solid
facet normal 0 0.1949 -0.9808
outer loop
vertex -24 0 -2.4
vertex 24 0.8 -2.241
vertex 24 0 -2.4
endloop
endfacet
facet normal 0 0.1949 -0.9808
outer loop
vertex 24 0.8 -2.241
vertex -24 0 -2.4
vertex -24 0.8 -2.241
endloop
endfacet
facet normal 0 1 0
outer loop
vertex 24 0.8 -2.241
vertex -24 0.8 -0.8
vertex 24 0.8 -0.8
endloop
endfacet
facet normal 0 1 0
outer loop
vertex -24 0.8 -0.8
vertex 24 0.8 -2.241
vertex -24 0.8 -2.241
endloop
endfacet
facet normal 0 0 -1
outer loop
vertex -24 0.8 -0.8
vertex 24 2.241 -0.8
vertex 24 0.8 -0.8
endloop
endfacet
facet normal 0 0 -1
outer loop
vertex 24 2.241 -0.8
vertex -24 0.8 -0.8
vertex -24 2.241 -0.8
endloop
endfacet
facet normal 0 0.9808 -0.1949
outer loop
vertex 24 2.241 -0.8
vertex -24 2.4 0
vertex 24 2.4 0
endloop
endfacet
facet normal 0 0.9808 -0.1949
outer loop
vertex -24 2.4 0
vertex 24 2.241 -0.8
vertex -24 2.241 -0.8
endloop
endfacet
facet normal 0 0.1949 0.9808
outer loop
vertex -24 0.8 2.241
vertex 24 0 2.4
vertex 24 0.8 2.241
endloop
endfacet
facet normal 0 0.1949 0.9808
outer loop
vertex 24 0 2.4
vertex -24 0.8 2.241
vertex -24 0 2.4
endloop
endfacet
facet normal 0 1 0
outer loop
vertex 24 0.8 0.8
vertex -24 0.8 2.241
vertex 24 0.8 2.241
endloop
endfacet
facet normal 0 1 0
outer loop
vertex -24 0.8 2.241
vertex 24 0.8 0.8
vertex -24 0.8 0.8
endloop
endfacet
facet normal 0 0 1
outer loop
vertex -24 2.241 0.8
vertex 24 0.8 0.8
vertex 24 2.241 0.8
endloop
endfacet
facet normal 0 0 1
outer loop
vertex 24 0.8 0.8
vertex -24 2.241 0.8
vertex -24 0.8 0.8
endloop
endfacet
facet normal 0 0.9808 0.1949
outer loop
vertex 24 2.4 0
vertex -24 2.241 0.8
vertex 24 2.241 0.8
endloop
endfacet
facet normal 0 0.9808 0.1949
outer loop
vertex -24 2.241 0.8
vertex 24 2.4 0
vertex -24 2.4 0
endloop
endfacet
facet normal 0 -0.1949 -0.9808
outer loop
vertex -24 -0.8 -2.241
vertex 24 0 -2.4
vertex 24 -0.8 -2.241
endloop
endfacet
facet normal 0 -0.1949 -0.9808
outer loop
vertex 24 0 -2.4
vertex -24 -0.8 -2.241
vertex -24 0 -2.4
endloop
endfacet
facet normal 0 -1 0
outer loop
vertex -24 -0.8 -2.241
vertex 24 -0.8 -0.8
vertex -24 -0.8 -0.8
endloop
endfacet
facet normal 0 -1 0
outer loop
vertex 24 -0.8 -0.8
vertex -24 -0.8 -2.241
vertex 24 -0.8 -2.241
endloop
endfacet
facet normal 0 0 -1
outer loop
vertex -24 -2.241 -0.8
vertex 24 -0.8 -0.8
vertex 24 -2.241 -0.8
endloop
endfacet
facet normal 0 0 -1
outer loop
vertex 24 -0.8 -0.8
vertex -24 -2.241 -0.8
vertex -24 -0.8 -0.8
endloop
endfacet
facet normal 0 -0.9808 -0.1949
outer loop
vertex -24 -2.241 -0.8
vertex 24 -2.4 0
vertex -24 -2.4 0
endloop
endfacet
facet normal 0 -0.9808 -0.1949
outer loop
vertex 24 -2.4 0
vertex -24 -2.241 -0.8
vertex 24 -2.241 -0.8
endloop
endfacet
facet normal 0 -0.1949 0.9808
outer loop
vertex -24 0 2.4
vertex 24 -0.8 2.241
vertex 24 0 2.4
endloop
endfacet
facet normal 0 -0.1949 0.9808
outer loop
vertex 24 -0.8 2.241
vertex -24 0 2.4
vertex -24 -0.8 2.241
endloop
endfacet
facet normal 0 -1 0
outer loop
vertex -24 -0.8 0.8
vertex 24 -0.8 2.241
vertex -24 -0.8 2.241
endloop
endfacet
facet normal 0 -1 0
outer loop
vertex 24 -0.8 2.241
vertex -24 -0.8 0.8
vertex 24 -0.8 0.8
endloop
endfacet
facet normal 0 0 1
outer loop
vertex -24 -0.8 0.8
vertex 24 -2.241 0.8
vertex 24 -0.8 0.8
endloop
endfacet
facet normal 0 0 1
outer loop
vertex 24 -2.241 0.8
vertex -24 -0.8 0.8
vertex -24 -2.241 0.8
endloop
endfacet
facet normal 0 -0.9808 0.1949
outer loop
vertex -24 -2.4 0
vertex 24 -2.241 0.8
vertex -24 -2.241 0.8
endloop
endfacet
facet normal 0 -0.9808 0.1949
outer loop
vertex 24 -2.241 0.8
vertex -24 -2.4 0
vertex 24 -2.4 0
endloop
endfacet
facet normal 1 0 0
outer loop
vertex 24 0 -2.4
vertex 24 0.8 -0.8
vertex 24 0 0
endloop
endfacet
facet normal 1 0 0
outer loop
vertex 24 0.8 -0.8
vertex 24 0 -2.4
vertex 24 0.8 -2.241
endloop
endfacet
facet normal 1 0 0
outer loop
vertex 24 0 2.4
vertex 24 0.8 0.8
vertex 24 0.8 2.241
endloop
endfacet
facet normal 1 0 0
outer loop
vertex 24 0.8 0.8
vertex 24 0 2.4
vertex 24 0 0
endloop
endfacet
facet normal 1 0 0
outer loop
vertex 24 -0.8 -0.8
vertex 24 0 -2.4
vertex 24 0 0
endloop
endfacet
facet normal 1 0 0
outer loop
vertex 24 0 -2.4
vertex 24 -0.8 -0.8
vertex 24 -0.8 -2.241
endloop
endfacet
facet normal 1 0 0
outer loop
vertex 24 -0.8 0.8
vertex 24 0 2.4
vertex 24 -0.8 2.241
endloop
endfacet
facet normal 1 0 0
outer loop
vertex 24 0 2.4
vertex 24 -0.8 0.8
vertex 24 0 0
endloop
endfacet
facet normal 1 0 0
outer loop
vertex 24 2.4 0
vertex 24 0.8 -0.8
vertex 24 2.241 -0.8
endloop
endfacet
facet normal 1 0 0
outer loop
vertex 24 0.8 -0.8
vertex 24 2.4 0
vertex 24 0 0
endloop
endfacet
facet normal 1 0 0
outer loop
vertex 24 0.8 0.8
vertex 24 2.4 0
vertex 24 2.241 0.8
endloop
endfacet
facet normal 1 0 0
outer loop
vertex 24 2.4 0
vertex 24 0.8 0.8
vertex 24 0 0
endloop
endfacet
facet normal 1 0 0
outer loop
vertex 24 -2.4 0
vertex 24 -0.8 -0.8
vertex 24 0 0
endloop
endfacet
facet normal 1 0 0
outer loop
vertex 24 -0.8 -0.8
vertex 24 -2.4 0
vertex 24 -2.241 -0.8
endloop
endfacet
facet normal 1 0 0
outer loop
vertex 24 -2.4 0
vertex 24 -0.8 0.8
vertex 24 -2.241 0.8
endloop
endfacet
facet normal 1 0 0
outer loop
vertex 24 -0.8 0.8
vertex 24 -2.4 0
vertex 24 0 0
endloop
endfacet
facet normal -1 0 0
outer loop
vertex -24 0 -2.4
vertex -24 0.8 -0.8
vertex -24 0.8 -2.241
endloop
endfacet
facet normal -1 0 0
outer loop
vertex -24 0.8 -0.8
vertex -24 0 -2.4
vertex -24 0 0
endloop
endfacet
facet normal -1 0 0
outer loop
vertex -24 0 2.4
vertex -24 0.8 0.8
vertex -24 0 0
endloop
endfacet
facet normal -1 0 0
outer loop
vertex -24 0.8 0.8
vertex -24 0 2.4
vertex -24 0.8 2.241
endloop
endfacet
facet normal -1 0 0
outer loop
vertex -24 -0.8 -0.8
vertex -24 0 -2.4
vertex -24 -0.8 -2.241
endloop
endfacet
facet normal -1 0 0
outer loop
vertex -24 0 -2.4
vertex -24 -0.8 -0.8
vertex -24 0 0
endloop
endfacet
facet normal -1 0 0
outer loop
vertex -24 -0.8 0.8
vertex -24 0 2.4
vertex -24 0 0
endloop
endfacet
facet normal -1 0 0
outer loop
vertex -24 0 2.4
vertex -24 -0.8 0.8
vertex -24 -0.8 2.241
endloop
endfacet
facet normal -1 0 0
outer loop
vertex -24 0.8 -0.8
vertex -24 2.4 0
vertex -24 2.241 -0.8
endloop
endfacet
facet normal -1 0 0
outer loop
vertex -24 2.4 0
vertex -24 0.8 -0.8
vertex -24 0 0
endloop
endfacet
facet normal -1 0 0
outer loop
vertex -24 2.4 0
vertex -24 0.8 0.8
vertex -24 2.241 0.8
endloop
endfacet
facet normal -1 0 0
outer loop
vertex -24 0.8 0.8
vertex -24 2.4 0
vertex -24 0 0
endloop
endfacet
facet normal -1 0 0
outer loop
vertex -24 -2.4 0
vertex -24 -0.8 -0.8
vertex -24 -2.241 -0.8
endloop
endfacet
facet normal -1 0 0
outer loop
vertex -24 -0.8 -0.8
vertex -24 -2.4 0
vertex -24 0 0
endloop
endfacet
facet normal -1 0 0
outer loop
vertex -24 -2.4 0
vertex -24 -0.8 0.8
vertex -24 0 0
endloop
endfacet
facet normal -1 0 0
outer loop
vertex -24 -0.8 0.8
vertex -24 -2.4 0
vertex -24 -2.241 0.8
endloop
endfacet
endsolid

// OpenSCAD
// file: ../p/axle.scad
use <../lib.scad>
function ldraw_lib__axle() = [
// 0 Axle
// 0 Name: axle.dat
// 0 Author: James Jessiman
// 0 !LDRAW_ORG Primitive UPDATE 2003-01
// 0 !LICENSE Licensed under CC BY 4.0 : see CAreadme.txt
// 
// 0 BFC CERTIFY CCW
  [0,"BFC","CERTIFY"],
  [0,"BFC","CCW"],
// 
// 0 !HISTORY 2000-04-23 [sbliss] Added conditional edges along outermost diameters
// 0 !HISTORY 2000-05-07 [PTadmin] Official Update 2000-01
// 0 !HISTORY 2002-11-08 [OrionP] Adjusted fit and precision
// 0 !HISTORY 2003-03-12 [PTadmin] Official Update 2003-01
// 0 !HISTORY 2007-06-24 [PTadmin] Header formatted for Contributor Agreement
// 0 !HISTORY 2008-07-01 [PTadmin] Official Update 2008-01
// 
// 
// 5 24 6 0 0 6 1 0 5.602 0 2 5.602 0 -2
  [5,24,6,0,0,6,1,0,5.602,0,2,5.602,0,-2],
// 5 24 0 0 6 0 1 6 2 0 5.602 -2 0 5.602
  [5,24,0,0,6,0,1,6,2,0,5.602,-2,0,5.602],
// 5 24 -6 0 0 -6 1 0 -5.602 0 -2 -5.602 0 2
  [5,24,-6,0,0,-6,1,0,-5.602,0,-2,-5.602,0,2],
// 5 24 0 0 -6 0 1 -6 -2 0 -5.602 2 0 -5.602
  [5,24,0,0,-6,0,1,-6,-2,0,-5.602,2,0,-5.602],
// 
// 2 24 6 0 0 5.602 0 2
  [2,24,6,0,0,5.602,0,2],
// 2 24 5.602 0 2 2 0 2
  [2,24,5.602,0,2,2,0,2],
// 2 24 2 0 2 2 0 5.602
  [2,24,2,0,2,2,0,5.602],
// 2 24 2 0 5.602 0 0 6
  [2,24,2,0,5.602,0,0,6],
// 2 24 -6 0 0 -5.602 0 2
  [2,24,-6,0,0,-5.602,0,2],
// 2 24 -5.602 0 2 -2 0 2
  [2,24,-5.602,0,2,-2,0,2],
// 2 24 -2 0 2 -2 0 5.602
  [2,24,-2,0,2,-2,0,5.602],
// 2 24 -2 0 5.602 -0 0 6
  [2,24,-2,0,5.602,-0,0,6],
// 2 24 6 0 -0 5.602 0 -2
  [2,24,6,0,-0,5.602,0,-2],
// 2 24 5.602 0 -2 2 0 -2
  [2,24,5.602,0,-2,2,0,-2],
// 2 24 2 0 -2 2 0 -5.602
  [2,24,2,0,-2,2,0,-5.602],
// 2 24 2 0 -5.602 0 0 -6
  [2,24,2,0,-5.602,0,0,-6],
// 2 24 -6 0 -0 -5.602 0 -2
  [2,24,-6,0,-0,-5.602,0,-2],
// 2 24 -5.602 0 -2 -2 0 -2
  [2,24,-5.602,0,-2,-2,0,-2],
// 2 24 -2 0 -2 -2 0 -5.602
  [2,24,-2,0,-2,-2,0,-5.602],
// 2 24 -2 0 -5.602 -0 0 -6
  [2,24,-2,0,-5.602,-0,0,-6],
// 2 24 6 1 0 5.602 1 2
  [2,24,6,1,0,5.602,1,2],
// 2 24 5.602 1 2 2 1 2
  [2,24,5.602,1,2,2,1,2],
// 2 24 2 1 2 2 1 5.602
  [2,24,2,1,2,2,1,5.602],
// 2 24 2 1 5.602 0 1 6
  [2,24,2,1,5.602,0,1,6],
// 2 24 -6 1 0 -5.602 1 2
  [2,24,-6,1,0,-5.602,1,2],
// 2 24 -5.602 1 2 -2 1 2
  [2,24,-5.602,1,2,-2,1,2],
// 2 24 -2 1 2 -2 1 5.602
  [2,24,-2,1,2,-2,1,5.602],
// 2 24 -2 1 5.602 -0 1 6
  [2,24,-2,1,5.602,-0,1,6],
// 2 24 6 1 -0 5.602 1 -2
  [2,24,6,1,-0,5.602,1,-2],
// 2 24 5.602 1 -2 2 1 -2
  [2,24,5.602,1,-2,2,1,-2],
// 2 24 2 1 -2 2 1 -5.602
  [2,24,2,1,-2,2,1,-5.602],
// 2 24 2 1 -5.602 0 1 -6
  [2,24,2,1,-5.602,0,1,-6],
// 2 24 -6 1 -0 -5.602 1 -2
  [2,24,-6,1,-0,-5.602,1,-2],
// 2 24 -5.602 1 -2 -2 1 -2
  [2,24,-5.602,1,-2,-2,1,-2],
// 2 24 -2 1 -2 -2 1 -5.602
  [2,24,-2,1,-2,-2,1,-5.602],
// 2 24 -2 1 -5.602 -0 1 -6
  [2,24,-2,1,-5.602,-0,1,-6],
// 
// 2 24 5.602 0 2 5.602 1 2
  [2,24,5.602,0,2,5.602,1,2],
// 2 24 2 0 2 2 1 2
  [2,24,2,0,2,2,1,2],
// 2 24 2 0 5.602 2 1 5.602
  [2,24,2,0,5.602,2,1,5.602],
// 2 24 -5.602 0 2 -5.602 1 2
  [2,24,-5.602,0,2,-5.602,1,2],
// 2 24 -2 0 2 -2 1 2
  [2,24,-2,0,2,-2,1,2],
// 2 24 -2 0 5.602 -2 1 5.602
  [2,24,-2,0,5.602,-2,1,5.602],
// 2 24 5.602 0 -2 5.602 1 -2
  [2,24,5.602,0,-2,5.602,1,-2],
// 2 24 2 0 -2 2 1 -2
  [2,24,2,0,-2,2,1,-2],
// 2 24 2 0 -5.602 2 1 -5.602
  [2,24,2,0,-5.602,2,1,-5.602],
// 2 24 -5.602 0 -2 -5.602 1 -2
  [2,24,-5.602,0,-2,-5.602,1,-2],
// 2 24 -2 0 -2 -2 1 -2
  [2,24,-2,0,-2,-2,1,-2],
// 2 24 -2 0 -5.602 -2 1 -5.602
  [2,24,-2,0,-5.602,-2,1,-5.602],
// 
// 4 16 6 0 0 6 1 0 5.602 1 2 5.602 0 2
  [4,16,6,0,0,6,1,0,5.602,1,2,5.602,0,2],
// 4 16 5.602 0 2 5.602 1 2 2 1 2 2 0 2
  [4,16,5.602,0,2,5.602,1,2,2,1,2,2,0,2],
// 4 16 2 0 2 2 1 2 2 1 5.602 2 0 5.602
  [4,16,2,0,2,2,1,2,2,1,5.602,2,0,5.602],
// 4 16 2 0 5.602 2 1 5.602 0 1 6 0 0 6
  [4,16,2,0,5.602,2,1,5.602,0,1,6,0,0,6],
// 4 16 -6 0 0 -5.602 0 2 -5.602 1 2 -6 1 0
  [4,16,-6,0,0,-5.602,0,2,-5.602,1,2,-6,1,0],
// 4 16 -5.602 0 2 -2 0 2 -2 1 2 -5.602 1 2
  [4,16,-5.602,0,2,-2,0,2,-2,1,2,-5.602,1,2],
// 4 16 -2 0 2 -2 0 5.602 -2 1 5.602 -2 1 2
  [4,16,-2,0,2,-2,0,5.602,-2,1,5.602,-2,1,2],
// 4 16 -2 0 5.602 -0 0 6 -0 1 6 -2 1 5.602
  [4,16,-2,0,5.602,-0,0,6,-0,1,6,-2,1,5.602],
// 4 16 6 0 -0 5.602 0 -2 5.602 1 -2 6 1 -0
  [4,16,6,0,-0,5.602,0,-2,5.602,1,-2,6,1,-0],
// 4 16 5.602 0 -2 2 0 -2 2 1 -2 5.602 1 -2
  [4,16,5.602,0,-2,2,0,-2,2,1,-2,5.602,1,-2],
// 4 16 2 0 -2 2 0 -5.602 2 1 -5.602 2 1 -2
  [4,16,2,0,-2,2,0,-5.602,2,1,-5.602,2,1,-2],
// 4 16 2 0 -5.602 0 0 -6 0 1 -6 2 1 -5.602
  [4,16,2,0,-5.602,0,0,-6,0,1,-6,2,1,-5.602],
// 4 16 -6 0 -0 -6 1 -0 -5.602 1 -2 -5.602 0 -2
  [4,16,-6,0,-0,-6,1,-0,-5.602,1,-2,-5.602,0,-2],
// 4 16 -5.602 0 -2 -5.602 1 -2 -2 1 -2 -2 0 -2
  [4,16,-5.602,0,-2,-5.602,1,-2,-2,1,-2,-2,0,-2],
// 4 16 -2 0 -2 -2 1 -2 -2 1 -5.602 -2 0 -5.602
  [4,16,-2,0,-2,-2,1,-2,-2,1,-5.602,-2,0,-5.602],
// 4 16 -2 0 -5.602 -2 1 -5.602 -0 1 -6 -0 0 -6
  [4,16,-2,0,-5.602,-2,1,-5.602,-0,1,-6,-0,0,-6],
// 
// 4 16 6 0 0 5.602 0 2 2 0 2 0 0 0
  [4,16,6,0,0,5.602,0,2,2,0,2,0,0,0],
// 4 16 -6 0 0 0 0 0 -2 0 2 -5.602 0 2
  [4,16,-6,0,0,0,0,0,-2,0,2,-5.602,0,2],
// 4 16 6 0 0 0 0 0 2 0 -2 5.602 0 -2
  [4,16,6,0,0,0,0,0,2,0,-2,5.602,0,-2],
// 4 16 -6 0 0 -5.602 0 -2 -2 0 -2 0 0 0
  [4,16,-6,0,0,-5.602,0,-2,-2,0,-2,0,0,0],
// 4 16 0 0 6 0 0 0 2 0 2 2 0 5.602
  [4,16,0,0,6,0,0,0,2,0,2,2,0,5.602],
// 4 16 0 0 6 -2 0 5.602 -2 0 2 0 0 0
  [4,16,0,0,6,-2,0,5.602,-2,0,2,0,0,0],
// 4 16 0 0 -6 2 0 -5.602 2 0 -2 0 0 0
  [4,16,0,0,-6,2,0,-5.602,2,0,-2,0,0,0],
// 4 16 0 0 -6 0 0 0 -2 0 -2 -2 0 -5.602
  [4,16,0,0,-6,0,0,0,-2,0,-2,-2,0,-5.602],
// 4 16 6 1 0 0 1 0 2 1 2 5.602 1 2
  [4,16,6,1,0,0,1,0,2,1,2,5.602,1,2],
// 4 16 -6 1 0 -5.602 1 2 -2 1 2 0 1 0
  [4,16,-6,1,0,-5.602,1,2,-2,1,2,0,1,0],
// 4 16 6 1 0 5.602 1 -2 2 1 -2 0 1 0
  [4,16,6,1,0,5.602,1,-2,2,1,-2,0,1,0],
// 4 16 -6 1 0 0 1 0 -2 1 -2 -5.602 1 -2
  [4,16,-6,1,0,0,1,0,-2,1,-2,-5.602,1,-2],
// 4 16 0 1 6 2 1 5.602 2 1 2 0 1 0
  [4,16,0,1,6,2,1,5.602,2,1,2,0,1,0],
// 4 16 0 1 6 0 1 0 -2 1 2 -2 1 5.602
  [4,16,0,1,6,0,1,0,-2,1,2,-2,1,5.602],
// 4 16 0 1 -6 0 1 0 2 1 -2 2 1 -5.602
  [4,16,0,1,-6,0,1,0,2,1,-2,2,1,-5.602],
// 4 16 0 1 -6 -2 1 -5.602 -2 1 -2 0 1 0
  [4,16,0,1,-6,-2,1,-5.602,-2,1,-2,0,1,0],
// 0
];
module ldraw_lib__axle(step=0, col=false, unit=2/5, alt=false, line=0.2, solid=!$preview)
    makepoly(ldraw_lib__axle(), step=step, col=col, unit=unit, alt=alt, line=line, solid=solid);
ldraw_lib__axle(line=0.2);
// file: 3706.scad
use <../lib.scad>
use <../p/axle.scad>
function ldraw_lib__3706() = [
// 0 Technic Axle  6
// 0 Name: 3706.dat
// 0 Author: James Jessiman
// 0 !LDRAW_ORG Part UPDATE 2005-01
// 0 !LICENSE Licensed under CC BY 2.0 and CC BY 4.0 : see CAreadme.txt
// 
// 0 BFC CERTIFY CCW
  [0,"BFC","CERTIFY"],
  [0,"BFC","CCW"],
// 
// 0 !HISTORY 2004-07-11 [guyvivan] BFC'ed
// 0 !HISTORY 2005-12-28 [PTadmin] Official Update 2005-01
// 0 !HISTORY 2007-06-29 [PTadmin] Header formatted for Contributor Agreement
// 0 !HISTORY 2008-07-01 [PTadmin] Official Update 2008-01
// 
// 
// 1 16 60 0 0 0 -120 0 1 0 0 0 0 1 axle.dat
  [1,16,60,0,0,0,-120,0,1,0,0,0,0,1, ldraw_lib__axle()],
// 0
// 
];
module ldraw_lib__3706(step=0, col=false, unit=2/5, alt=false, line=0.2, solid=!$preview)
    makepoly(ldraw_lib__3706(), step=step, col=col, unit=unit, alt=alt, line=line, solid=solid);
ldraw_lib__3706(line=0.2);
// main file
use <../lib.scad>
use <3706.scad>
function ldraw_lib__370626() = [
// 0 ~_Technic Axle  6 Black (Obsolete)
// 0 Name: 370626.dat
// 0 Author: Michael Heidemann [mikeheide]
// 0 !LDRAW_ORG Part Physical_Colour UPDATE 2019-02
// 0 !LICENSE Licensed under CC BY 4.0 : see CAreadme.txt
// 
// 0 BFC CERTIFY CCW
  [0,"BFC","CERTIFY"],
  [0,"BFC","CCW"],
// 
// 0 !HISTORY 2010-12-31 [PTadmin] Official Update 2010-03
// 0 !HISTORY 2019-07-22 [Holly-Wood] Obsoleted per decision not to include physical colour parts
// 0 !HISTORY 2019-09-09 [PTadmin] Official Update 2019-02
// 
// 
// 1 0 0 0 0 1 0 0 0 1 0 0 0 1 3706.dat
  [1,0,0,0,0,1,0,0,0,1,0,0,0,1, ldraw_lib__3706()],
];
module ldraw_lib__370626(step=0, col=false, unit=2/5, alt=false, line=0.2, solid=!$preview)
    makepoly(ldraw_lib__370626(), step=step, col=col, unit=unit, alt=alt, line=line, solid=solid);
ldraw_lib__370626(line=0.2);
